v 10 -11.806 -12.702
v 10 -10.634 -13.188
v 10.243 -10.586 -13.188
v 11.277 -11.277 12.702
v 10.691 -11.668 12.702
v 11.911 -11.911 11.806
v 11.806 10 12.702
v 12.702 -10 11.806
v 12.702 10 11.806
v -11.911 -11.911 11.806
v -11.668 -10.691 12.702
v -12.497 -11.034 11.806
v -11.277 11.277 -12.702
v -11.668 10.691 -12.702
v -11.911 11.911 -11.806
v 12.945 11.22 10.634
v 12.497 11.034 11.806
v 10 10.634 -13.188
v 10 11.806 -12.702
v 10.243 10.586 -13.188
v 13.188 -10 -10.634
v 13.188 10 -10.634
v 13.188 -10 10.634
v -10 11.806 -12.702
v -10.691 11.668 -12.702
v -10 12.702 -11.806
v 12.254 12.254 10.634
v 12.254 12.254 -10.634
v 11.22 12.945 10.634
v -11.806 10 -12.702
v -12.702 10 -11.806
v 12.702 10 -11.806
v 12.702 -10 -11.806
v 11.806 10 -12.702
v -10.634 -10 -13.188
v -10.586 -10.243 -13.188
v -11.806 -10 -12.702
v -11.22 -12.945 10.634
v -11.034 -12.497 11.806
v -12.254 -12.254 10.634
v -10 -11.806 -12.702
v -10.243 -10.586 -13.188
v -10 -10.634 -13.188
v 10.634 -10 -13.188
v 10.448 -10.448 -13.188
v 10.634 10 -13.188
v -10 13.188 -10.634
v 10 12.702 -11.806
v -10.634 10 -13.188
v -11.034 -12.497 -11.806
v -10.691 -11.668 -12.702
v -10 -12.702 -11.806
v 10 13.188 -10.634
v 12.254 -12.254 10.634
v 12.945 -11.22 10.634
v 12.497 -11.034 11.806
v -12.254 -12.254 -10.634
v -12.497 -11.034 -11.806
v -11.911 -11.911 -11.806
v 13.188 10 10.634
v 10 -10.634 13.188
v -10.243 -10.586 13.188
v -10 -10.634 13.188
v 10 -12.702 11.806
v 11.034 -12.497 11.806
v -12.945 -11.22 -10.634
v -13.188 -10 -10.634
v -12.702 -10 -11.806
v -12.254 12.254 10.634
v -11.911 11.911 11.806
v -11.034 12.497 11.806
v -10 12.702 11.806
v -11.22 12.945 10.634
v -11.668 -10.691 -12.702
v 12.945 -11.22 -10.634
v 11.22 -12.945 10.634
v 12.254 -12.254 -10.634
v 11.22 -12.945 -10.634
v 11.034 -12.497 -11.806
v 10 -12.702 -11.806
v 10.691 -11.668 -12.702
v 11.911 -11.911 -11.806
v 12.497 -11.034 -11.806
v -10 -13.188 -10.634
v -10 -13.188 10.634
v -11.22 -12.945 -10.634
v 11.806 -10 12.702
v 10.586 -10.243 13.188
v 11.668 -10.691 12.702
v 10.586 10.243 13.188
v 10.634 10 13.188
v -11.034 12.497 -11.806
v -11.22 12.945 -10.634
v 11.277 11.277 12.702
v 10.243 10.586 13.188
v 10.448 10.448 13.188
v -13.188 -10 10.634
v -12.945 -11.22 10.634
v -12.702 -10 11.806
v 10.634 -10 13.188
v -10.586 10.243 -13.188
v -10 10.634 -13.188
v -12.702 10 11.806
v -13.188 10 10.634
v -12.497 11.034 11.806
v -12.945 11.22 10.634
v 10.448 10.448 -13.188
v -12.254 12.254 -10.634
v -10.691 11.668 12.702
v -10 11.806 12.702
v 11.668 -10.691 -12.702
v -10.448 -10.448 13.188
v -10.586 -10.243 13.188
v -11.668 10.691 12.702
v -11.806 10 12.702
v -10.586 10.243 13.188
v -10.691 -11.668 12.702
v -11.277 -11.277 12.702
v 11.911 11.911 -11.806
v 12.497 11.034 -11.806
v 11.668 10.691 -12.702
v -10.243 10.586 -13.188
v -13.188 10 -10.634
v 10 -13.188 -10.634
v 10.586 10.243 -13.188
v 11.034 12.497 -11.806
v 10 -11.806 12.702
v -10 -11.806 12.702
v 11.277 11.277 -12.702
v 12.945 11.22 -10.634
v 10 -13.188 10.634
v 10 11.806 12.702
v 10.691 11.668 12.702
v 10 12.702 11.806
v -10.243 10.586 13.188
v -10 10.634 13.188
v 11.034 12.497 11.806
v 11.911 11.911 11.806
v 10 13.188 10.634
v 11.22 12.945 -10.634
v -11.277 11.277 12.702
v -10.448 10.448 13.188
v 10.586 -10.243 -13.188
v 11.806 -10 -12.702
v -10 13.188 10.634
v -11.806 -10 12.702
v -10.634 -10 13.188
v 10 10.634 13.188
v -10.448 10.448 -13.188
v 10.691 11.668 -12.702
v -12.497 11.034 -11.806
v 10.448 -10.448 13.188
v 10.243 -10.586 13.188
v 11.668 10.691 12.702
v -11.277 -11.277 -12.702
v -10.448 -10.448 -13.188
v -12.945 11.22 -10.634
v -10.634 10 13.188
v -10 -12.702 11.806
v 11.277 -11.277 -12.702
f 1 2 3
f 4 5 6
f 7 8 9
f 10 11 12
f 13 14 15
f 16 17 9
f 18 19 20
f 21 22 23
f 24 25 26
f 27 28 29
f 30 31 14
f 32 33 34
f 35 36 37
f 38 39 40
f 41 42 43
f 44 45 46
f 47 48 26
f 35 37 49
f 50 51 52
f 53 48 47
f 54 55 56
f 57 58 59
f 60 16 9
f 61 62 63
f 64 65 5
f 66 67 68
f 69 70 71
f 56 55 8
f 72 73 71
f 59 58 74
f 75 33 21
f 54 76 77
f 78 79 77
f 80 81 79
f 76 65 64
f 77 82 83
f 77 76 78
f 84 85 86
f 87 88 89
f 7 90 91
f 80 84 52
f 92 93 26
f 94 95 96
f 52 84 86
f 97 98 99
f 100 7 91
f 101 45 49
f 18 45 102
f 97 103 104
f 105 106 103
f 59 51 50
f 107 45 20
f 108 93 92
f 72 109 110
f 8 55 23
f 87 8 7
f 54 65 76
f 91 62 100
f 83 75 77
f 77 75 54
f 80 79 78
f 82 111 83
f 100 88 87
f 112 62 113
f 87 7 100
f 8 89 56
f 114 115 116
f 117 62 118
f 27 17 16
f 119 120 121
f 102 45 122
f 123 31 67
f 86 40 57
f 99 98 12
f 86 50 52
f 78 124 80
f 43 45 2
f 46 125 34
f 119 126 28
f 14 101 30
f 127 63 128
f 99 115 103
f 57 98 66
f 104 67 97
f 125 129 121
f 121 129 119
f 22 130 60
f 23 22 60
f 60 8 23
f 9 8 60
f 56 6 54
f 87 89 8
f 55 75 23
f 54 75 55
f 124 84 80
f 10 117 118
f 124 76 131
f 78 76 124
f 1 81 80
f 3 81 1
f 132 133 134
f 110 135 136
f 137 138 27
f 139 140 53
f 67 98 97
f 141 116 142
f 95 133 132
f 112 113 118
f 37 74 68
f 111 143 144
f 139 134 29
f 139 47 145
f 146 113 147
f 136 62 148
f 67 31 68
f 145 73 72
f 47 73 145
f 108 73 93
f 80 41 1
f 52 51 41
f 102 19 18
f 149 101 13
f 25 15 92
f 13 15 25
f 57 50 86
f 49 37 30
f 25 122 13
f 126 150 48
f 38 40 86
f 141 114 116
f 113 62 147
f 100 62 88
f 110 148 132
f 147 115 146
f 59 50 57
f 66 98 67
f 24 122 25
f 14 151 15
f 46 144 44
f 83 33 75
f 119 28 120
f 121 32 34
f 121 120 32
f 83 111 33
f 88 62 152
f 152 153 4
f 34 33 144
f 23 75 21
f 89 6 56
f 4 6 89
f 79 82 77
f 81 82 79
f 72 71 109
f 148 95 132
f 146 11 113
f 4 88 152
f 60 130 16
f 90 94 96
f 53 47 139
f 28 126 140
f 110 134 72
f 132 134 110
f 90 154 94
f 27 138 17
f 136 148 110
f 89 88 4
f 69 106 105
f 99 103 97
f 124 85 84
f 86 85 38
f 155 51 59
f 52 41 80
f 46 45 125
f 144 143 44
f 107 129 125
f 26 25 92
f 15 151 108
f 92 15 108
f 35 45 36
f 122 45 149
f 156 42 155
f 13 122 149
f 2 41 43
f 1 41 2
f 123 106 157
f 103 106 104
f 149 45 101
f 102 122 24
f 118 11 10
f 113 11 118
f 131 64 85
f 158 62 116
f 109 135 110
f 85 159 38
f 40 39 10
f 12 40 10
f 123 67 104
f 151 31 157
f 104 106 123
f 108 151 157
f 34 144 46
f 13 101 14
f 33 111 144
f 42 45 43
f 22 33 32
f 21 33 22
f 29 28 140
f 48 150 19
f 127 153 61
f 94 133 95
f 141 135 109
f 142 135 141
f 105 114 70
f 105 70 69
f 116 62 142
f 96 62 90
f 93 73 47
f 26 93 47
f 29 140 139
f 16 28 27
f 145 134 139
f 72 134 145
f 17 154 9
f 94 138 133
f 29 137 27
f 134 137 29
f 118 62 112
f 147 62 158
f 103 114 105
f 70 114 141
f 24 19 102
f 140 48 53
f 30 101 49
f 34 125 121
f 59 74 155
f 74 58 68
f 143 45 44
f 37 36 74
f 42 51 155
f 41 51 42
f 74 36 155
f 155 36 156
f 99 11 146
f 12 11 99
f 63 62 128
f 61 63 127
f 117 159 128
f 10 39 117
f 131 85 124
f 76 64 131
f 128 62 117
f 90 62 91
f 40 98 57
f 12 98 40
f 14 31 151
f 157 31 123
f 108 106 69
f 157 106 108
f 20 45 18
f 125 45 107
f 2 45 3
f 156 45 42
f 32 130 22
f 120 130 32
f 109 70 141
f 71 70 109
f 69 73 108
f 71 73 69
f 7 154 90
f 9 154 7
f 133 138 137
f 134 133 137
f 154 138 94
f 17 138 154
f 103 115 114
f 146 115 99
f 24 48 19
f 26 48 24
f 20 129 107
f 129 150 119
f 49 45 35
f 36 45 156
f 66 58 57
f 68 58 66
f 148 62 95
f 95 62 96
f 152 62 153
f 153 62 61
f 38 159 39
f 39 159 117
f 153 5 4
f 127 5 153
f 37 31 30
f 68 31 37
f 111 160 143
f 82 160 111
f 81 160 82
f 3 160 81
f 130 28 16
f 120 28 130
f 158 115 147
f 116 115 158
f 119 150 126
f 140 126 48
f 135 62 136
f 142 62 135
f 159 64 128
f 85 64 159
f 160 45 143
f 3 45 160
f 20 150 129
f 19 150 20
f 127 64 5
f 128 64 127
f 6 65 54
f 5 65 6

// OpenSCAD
// A sphere whose radius is a computed expression the parser cannot resolve.
// Documented behaviour: the term is SKIPPED, never guessed -- an invented
// radius would silently widen the tolerance, which is the failure mode the
// whole module exists to prevent. (Was 'r_guess = wall * 1.5' until
// 2026-11-14; plain arithmetic over scalars now resolves exactly, so a
// function call is used instead.)
$fa = 2; $fs = 0.3;
wall = 2;
function r_for(w) = w * 1.5;

minkowski() {
    cube([20, 20, 20], center = true);
    sphere(r = r_for(wall) + 0.25, $fn = 16);
}
